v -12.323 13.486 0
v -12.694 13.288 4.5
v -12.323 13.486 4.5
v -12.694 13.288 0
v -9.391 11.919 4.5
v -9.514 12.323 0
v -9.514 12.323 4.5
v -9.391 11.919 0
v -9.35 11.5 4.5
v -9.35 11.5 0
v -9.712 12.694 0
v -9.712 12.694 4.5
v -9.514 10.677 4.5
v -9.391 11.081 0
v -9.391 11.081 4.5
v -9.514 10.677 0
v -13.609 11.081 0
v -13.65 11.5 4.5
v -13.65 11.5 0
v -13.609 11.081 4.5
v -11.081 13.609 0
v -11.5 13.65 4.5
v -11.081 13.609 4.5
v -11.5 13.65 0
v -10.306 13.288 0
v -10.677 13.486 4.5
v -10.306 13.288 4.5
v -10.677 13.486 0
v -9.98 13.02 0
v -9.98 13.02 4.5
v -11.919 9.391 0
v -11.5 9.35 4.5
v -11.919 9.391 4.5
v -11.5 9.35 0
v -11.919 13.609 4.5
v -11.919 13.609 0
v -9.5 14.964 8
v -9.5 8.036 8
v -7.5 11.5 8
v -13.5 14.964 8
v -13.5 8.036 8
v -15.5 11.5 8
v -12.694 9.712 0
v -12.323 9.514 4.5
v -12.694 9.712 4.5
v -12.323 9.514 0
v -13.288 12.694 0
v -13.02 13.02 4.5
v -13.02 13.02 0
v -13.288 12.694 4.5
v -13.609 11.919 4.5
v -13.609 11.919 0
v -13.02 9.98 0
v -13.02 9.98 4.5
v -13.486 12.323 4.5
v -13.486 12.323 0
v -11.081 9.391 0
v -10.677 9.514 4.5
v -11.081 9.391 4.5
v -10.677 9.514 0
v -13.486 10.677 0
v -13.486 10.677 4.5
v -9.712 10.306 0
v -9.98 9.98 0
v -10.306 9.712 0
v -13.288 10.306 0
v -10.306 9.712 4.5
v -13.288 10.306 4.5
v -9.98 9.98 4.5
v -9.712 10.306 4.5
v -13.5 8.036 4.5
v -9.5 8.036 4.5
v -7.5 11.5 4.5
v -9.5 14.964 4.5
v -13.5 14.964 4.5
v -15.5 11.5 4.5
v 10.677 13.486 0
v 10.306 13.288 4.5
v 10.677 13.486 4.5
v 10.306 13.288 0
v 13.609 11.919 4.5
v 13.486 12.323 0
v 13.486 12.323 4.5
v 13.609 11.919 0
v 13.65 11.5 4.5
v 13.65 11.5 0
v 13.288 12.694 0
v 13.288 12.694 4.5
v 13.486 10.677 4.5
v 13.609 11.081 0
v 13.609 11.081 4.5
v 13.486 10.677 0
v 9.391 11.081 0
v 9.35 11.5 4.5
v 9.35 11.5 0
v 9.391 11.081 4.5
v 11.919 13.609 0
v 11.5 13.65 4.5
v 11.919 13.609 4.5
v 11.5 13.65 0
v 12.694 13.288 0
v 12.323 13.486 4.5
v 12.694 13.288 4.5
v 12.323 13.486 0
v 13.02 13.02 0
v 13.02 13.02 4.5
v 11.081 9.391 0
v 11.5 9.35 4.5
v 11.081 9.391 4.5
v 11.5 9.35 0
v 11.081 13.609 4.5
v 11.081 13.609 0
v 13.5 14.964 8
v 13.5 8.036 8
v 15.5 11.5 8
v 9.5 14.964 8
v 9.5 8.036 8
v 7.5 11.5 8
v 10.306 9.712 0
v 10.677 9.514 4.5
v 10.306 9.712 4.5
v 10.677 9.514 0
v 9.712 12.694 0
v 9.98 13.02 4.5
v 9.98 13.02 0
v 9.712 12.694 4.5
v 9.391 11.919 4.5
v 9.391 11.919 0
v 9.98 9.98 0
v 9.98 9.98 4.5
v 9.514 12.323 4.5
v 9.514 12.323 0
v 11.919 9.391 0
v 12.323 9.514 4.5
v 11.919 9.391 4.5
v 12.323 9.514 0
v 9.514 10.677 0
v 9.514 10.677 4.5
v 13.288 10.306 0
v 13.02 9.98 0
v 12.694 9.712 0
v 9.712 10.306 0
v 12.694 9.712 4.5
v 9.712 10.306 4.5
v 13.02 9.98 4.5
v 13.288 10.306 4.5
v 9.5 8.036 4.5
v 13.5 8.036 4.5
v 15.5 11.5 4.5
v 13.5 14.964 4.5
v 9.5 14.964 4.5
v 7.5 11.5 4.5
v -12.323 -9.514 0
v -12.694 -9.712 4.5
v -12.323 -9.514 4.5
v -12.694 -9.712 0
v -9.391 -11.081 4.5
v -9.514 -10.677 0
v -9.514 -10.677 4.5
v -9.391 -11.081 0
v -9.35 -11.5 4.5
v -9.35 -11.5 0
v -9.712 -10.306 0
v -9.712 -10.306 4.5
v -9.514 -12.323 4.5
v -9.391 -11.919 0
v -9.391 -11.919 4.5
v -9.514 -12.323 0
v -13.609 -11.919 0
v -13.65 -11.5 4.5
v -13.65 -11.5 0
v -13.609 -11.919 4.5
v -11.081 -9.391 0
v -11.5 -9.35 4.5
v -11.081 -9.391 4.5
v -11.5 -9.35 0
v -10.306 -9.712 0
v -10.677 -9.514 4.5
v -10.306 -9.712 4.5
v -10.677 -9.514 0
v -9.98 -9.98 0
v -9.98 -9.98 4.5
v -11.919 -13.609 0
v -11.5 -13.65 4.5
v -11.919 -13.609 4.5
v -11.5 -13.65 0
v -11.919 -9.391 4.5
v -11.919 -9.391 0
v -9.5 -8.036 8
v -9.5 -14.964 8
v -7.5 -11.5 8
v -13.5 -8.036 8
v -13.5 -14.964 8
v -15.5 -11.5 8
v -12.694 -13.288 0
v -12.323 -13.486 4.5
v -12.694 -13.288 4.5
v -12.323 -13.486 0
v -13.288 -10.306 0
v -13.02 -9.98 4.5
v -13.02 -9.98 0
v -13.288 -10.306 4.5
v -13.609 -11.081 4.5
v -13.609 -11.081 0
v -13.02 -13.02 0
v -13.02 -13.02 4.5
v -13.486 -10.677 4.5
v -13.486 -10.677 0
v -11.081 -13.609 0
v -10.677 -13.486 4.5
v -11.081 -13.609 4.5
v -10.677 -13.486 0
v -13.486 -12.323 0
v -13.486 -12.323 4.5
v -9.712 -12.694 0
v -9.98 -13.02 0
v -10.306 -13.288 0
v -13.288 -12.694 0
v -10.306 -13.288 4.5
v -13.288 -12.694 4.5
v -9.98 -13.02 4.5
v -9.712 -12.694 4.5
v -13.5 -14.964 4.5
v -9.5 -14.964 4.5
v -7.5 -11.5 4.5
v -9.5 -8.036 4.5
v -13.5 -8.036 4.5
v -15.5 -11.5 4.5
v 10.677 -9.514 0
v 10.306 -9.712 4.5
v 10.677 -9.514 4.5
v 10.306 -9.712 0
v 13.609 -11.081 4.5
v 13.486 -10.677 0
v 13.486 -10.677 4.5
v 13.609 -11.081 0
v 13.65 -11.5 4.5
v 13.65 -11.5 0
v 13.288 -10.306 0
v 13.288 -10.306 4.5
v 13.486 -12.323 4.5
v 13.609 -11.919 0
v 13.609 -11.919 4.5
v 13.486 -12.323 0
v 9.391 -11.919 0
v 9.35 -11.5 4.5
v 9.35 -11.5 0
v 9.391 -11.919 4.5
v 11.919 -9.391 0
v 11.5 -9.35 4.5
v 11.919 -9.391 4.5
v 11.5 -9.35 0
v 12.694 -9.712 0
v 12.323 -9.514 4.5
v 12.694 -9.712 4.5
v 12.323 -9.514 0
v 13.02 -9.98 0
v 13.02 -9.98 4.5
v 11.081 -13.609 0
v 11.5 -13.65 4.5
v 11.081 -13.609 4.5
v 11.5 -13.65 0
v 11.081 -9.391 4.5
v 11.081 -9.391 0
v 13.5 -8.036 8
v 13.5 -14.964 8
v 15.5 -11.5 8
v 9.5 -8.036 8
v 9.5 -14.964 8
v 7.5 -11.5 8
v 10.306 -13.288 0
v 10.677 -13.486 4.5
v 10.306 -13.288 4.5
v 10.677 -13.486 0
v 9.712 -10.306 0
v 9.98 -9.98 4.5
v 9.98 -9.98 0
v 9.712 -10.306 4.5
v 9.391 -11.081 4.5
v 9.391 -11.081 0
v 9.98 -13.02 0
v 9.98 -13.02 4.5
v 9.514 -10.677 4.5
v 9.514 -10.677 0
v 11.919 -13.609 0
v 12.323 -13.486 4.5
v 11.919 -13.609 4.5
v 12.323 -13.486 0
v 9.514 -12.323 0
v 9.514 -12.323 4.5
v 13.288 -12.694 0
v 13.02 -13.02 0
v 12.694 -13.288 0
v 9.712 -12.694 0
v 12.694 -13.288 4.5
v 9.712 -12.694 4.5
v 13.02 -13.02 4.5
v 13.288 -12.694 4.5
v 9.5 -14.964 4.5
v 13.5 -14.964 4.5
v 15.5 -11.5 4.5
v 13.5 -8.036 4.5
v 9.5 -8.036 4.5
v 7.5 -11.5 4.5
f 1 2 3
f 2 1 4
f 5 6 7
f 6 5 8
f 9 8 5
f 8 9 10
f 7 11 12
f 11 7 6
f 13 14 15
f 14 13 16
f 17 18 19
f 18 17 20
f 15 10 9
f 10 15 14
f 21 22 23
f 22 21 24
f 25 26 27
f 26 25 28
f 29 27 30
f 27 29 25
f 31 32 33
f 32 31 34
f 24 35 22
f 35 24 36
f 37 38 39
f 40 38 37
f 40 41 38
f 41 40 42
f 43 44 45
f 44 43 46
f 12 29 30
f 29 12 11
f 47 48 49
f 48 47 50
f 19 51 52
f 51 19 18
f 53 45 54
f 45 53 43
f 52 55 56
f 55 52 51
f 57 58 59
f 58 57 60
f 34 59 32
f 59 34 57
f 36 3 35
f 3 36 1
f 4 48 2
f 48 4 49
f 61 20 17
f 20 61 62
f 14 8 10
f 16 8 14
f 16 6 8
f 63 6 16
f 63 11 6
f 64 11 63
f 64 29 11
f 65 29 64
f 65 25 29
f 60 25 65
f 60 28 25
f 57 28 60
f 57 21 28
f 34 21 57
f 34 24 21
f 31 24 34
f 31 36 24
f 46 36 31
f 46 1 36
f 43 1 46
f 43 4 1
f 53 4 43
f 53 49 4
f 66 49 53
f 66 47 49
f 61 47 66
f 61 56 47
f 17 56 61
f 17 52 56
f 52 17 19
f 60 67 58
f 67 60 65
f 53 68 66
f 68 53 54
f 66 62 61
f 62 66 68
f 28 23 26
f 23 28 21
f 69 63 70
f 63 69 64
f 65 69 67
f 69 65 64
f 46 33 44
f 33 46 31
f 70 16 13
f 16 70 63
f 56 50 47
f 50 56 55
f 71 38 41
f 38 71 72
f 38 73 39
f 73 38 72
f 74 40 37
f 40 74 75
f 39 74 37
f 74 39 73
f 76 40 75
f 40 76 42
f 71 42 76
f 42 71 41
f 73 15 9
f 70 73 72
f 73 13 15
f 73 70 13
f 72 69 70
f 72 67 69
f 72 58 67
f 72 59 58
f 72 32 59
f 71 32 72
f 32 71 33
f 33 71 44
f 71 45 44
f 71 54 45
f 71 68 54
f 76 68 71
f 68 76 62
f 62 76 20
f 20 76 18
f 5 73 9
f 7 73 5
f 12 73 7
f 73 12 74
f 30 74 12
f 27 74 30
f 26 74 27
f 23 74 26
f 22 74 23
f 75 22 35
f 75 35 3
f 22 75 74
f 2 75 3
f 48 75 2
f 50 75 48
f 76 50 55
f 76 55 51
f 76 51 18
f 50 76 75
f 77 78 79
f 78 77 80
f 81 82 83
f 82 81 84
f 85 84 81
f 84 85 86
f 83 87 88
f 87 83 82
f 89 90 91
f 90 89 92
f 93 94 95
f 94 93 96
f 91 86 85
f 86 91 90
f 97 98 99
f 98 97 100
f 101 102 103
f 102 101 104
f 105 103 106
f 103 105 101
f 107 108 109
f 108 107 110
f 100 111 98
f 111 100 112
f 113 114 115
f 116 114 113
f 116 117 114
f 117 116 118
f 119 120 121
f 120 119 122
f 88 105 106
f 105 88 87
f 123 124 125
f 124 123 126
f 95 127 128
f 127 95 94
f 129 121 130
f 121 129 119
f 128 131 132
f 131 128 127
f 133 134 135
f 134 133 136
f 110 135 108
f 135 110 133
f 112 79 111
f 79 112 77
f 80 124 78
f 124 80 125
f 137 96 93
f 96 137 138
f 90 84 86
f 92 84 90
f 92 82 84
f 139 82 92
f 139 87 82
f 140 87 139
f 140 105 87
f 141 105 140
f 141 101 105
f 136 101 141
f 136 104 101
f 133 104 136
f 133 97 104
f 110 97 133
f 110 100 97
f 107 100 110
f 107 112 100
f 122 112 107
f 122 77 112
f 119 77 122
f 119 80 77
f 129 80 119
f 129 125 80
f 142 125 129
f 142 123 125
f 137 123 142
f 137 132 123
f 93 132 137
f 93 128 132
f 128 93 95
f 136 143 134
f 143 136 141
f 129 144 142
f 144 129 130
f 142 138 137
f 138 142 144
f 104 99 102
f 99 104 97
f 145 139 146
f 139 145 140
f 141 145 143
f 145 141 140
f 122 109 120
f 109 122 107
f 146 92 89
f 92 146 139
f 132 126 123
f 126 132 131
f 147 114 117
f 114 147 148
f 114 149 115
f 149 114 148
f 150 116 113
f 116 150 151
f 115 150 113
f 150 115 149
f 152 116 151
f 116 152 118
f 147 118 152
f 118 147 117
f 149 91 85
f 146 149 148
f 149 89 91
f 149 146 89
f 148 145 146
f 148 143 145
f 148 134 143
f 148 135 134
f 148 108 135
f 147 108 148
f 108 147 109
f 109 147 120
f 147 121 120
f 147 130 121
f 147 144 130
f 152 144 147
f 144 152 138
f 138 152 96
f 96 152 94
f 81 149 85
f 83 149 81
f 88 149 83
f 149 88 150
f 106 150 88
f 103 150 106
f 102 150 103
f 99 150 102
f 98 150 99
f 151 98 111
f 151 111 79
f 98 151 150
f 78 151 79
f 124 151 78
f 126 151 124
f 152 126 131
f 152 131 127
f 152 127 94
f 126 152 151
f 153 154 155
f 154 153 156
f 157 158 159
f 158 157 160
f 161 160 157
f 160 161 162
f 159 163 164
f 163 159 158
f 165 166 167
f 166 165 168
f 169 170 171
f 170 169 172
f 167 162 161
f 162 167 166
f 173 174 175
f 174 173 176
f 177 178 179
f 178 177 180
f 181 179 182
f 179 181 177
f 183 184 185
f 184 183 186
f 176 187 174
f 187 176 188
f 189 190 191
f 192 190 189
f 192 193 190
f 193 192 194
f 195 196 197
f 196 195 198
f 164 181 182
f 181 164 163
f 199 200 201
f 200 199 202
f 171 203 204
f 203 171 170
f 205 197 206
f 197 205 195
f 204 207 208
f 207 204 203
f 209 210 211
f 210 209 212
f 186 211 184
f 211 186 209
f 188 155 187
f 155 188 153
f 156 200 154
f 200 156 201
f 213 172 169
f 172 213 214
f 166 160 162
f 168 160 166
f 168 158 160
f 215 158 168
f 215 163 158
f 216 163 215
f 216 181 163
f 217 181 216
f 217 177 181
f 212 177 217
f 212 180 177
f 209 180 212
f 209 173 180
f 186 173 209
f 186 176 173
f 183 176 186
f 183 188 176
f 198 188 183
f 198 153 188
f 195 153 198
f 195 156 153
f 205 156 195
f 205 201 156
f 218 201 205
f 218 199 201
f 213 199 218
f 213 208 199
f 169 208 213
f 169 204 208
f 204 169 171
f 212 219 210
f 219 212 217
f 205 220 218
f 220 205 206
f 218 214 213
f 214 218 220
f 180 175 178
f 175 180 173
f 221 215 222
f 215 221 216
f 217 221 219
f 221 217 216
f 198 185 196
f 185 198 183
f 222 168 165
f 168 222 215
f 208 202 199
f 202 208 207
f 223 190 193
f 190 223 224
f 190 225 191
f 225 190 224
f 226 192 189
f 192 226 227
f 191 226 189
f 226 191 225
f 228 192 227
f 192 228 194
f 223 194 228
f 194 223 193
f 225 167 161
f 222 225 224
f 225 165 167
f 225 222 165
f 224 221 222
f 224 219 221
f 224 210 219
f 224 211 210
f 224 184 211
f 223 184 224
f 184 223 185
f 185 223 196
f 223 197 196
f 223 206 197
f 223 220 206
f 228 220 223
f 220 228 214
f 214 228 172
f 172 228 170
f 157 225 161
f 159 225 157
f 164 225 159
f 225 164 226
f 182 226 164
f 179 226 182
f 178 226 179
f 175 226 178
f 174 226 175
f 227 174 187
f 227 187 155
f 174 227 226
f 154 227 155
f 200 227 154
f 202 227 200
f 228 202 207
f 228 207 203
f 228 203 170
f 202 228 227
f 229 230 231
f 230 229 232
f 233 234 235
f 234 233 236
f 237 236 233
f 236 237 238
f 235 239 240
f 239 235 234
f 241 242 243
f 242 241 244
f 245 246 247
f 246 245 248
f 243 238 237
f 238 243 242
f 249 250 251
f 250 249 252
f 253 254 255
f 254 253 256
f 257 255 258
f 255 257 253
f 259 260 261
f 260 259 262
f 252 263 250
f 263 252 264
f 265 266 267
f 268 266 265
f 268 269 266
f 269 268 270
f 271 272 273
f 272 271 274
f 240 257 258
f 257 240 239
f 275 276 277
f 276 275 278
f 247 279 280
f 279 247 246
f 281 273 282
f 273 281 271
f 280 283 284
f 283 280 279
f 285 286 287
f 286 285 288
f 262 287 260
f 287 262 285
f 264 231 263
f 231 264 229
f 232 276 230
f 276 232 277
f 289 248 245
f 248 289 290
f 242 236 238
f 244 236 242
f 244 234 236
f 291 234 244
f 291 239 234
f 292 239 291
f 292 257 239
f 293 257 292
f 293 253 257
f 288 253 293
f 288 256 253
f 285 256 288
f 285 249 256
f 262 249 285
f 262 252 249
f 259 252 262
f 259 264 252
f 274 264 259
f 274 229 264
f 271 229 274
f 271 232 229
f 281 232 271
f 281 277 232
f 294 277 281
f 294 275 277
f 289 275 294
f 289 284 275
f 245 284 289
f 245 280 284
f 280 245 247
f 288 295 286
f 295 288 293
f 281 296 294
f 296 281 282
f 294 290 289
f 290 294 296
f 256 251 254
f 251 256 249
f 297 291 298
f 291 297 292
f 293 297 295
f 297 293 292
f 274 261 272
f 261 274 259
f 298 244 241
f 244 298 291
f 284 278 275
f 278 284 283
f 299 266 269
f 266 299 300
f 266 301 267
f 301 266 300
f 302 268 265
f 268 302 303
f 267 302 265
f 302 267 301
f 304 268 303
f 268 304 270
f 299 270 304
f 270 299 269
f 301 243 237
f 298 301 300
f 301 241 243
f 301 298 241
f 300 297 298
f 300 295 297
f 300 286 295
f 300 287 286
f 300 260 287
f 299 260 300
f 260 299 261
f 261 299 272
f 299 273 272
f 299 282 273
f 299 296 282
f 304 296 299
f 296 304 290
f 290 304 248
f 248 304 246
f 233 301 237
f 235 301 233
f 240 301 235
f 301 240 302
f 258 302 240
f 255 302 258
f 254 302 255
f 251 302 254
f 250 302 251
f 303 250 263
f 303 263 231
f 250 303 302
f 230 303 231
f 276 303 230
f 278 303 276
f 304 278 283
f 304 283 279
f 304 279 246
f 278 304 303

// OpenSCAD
PrusaReworkMountHoles();

module PrusaReworkMountHoles(holeSep = 23)
{
translate([-holeSep/2,holeSep/2,0]) CaptiveNutHole();
translate([holeSep/2,holeSep/2,0]) CaptiveNutHole();
translate([-holeSep/2,-holeSep/2,0]) CaptiveNutHole();
translate([holeSep/2,-holeSep/2,0]) CaptiveNutHole();
}

module CaptiveNutHole(screwDia = 4.3,nutDia = 8, nutThick=3.5, thick = 8)
{
translate([0,0,thick])
mirror([0,0,1])
	{
	cylinder(d = screwDia,h=thick, $fn = 32);
	cylinder(d = nutDia,h=nutThick, $fn = 6);
	}
}
